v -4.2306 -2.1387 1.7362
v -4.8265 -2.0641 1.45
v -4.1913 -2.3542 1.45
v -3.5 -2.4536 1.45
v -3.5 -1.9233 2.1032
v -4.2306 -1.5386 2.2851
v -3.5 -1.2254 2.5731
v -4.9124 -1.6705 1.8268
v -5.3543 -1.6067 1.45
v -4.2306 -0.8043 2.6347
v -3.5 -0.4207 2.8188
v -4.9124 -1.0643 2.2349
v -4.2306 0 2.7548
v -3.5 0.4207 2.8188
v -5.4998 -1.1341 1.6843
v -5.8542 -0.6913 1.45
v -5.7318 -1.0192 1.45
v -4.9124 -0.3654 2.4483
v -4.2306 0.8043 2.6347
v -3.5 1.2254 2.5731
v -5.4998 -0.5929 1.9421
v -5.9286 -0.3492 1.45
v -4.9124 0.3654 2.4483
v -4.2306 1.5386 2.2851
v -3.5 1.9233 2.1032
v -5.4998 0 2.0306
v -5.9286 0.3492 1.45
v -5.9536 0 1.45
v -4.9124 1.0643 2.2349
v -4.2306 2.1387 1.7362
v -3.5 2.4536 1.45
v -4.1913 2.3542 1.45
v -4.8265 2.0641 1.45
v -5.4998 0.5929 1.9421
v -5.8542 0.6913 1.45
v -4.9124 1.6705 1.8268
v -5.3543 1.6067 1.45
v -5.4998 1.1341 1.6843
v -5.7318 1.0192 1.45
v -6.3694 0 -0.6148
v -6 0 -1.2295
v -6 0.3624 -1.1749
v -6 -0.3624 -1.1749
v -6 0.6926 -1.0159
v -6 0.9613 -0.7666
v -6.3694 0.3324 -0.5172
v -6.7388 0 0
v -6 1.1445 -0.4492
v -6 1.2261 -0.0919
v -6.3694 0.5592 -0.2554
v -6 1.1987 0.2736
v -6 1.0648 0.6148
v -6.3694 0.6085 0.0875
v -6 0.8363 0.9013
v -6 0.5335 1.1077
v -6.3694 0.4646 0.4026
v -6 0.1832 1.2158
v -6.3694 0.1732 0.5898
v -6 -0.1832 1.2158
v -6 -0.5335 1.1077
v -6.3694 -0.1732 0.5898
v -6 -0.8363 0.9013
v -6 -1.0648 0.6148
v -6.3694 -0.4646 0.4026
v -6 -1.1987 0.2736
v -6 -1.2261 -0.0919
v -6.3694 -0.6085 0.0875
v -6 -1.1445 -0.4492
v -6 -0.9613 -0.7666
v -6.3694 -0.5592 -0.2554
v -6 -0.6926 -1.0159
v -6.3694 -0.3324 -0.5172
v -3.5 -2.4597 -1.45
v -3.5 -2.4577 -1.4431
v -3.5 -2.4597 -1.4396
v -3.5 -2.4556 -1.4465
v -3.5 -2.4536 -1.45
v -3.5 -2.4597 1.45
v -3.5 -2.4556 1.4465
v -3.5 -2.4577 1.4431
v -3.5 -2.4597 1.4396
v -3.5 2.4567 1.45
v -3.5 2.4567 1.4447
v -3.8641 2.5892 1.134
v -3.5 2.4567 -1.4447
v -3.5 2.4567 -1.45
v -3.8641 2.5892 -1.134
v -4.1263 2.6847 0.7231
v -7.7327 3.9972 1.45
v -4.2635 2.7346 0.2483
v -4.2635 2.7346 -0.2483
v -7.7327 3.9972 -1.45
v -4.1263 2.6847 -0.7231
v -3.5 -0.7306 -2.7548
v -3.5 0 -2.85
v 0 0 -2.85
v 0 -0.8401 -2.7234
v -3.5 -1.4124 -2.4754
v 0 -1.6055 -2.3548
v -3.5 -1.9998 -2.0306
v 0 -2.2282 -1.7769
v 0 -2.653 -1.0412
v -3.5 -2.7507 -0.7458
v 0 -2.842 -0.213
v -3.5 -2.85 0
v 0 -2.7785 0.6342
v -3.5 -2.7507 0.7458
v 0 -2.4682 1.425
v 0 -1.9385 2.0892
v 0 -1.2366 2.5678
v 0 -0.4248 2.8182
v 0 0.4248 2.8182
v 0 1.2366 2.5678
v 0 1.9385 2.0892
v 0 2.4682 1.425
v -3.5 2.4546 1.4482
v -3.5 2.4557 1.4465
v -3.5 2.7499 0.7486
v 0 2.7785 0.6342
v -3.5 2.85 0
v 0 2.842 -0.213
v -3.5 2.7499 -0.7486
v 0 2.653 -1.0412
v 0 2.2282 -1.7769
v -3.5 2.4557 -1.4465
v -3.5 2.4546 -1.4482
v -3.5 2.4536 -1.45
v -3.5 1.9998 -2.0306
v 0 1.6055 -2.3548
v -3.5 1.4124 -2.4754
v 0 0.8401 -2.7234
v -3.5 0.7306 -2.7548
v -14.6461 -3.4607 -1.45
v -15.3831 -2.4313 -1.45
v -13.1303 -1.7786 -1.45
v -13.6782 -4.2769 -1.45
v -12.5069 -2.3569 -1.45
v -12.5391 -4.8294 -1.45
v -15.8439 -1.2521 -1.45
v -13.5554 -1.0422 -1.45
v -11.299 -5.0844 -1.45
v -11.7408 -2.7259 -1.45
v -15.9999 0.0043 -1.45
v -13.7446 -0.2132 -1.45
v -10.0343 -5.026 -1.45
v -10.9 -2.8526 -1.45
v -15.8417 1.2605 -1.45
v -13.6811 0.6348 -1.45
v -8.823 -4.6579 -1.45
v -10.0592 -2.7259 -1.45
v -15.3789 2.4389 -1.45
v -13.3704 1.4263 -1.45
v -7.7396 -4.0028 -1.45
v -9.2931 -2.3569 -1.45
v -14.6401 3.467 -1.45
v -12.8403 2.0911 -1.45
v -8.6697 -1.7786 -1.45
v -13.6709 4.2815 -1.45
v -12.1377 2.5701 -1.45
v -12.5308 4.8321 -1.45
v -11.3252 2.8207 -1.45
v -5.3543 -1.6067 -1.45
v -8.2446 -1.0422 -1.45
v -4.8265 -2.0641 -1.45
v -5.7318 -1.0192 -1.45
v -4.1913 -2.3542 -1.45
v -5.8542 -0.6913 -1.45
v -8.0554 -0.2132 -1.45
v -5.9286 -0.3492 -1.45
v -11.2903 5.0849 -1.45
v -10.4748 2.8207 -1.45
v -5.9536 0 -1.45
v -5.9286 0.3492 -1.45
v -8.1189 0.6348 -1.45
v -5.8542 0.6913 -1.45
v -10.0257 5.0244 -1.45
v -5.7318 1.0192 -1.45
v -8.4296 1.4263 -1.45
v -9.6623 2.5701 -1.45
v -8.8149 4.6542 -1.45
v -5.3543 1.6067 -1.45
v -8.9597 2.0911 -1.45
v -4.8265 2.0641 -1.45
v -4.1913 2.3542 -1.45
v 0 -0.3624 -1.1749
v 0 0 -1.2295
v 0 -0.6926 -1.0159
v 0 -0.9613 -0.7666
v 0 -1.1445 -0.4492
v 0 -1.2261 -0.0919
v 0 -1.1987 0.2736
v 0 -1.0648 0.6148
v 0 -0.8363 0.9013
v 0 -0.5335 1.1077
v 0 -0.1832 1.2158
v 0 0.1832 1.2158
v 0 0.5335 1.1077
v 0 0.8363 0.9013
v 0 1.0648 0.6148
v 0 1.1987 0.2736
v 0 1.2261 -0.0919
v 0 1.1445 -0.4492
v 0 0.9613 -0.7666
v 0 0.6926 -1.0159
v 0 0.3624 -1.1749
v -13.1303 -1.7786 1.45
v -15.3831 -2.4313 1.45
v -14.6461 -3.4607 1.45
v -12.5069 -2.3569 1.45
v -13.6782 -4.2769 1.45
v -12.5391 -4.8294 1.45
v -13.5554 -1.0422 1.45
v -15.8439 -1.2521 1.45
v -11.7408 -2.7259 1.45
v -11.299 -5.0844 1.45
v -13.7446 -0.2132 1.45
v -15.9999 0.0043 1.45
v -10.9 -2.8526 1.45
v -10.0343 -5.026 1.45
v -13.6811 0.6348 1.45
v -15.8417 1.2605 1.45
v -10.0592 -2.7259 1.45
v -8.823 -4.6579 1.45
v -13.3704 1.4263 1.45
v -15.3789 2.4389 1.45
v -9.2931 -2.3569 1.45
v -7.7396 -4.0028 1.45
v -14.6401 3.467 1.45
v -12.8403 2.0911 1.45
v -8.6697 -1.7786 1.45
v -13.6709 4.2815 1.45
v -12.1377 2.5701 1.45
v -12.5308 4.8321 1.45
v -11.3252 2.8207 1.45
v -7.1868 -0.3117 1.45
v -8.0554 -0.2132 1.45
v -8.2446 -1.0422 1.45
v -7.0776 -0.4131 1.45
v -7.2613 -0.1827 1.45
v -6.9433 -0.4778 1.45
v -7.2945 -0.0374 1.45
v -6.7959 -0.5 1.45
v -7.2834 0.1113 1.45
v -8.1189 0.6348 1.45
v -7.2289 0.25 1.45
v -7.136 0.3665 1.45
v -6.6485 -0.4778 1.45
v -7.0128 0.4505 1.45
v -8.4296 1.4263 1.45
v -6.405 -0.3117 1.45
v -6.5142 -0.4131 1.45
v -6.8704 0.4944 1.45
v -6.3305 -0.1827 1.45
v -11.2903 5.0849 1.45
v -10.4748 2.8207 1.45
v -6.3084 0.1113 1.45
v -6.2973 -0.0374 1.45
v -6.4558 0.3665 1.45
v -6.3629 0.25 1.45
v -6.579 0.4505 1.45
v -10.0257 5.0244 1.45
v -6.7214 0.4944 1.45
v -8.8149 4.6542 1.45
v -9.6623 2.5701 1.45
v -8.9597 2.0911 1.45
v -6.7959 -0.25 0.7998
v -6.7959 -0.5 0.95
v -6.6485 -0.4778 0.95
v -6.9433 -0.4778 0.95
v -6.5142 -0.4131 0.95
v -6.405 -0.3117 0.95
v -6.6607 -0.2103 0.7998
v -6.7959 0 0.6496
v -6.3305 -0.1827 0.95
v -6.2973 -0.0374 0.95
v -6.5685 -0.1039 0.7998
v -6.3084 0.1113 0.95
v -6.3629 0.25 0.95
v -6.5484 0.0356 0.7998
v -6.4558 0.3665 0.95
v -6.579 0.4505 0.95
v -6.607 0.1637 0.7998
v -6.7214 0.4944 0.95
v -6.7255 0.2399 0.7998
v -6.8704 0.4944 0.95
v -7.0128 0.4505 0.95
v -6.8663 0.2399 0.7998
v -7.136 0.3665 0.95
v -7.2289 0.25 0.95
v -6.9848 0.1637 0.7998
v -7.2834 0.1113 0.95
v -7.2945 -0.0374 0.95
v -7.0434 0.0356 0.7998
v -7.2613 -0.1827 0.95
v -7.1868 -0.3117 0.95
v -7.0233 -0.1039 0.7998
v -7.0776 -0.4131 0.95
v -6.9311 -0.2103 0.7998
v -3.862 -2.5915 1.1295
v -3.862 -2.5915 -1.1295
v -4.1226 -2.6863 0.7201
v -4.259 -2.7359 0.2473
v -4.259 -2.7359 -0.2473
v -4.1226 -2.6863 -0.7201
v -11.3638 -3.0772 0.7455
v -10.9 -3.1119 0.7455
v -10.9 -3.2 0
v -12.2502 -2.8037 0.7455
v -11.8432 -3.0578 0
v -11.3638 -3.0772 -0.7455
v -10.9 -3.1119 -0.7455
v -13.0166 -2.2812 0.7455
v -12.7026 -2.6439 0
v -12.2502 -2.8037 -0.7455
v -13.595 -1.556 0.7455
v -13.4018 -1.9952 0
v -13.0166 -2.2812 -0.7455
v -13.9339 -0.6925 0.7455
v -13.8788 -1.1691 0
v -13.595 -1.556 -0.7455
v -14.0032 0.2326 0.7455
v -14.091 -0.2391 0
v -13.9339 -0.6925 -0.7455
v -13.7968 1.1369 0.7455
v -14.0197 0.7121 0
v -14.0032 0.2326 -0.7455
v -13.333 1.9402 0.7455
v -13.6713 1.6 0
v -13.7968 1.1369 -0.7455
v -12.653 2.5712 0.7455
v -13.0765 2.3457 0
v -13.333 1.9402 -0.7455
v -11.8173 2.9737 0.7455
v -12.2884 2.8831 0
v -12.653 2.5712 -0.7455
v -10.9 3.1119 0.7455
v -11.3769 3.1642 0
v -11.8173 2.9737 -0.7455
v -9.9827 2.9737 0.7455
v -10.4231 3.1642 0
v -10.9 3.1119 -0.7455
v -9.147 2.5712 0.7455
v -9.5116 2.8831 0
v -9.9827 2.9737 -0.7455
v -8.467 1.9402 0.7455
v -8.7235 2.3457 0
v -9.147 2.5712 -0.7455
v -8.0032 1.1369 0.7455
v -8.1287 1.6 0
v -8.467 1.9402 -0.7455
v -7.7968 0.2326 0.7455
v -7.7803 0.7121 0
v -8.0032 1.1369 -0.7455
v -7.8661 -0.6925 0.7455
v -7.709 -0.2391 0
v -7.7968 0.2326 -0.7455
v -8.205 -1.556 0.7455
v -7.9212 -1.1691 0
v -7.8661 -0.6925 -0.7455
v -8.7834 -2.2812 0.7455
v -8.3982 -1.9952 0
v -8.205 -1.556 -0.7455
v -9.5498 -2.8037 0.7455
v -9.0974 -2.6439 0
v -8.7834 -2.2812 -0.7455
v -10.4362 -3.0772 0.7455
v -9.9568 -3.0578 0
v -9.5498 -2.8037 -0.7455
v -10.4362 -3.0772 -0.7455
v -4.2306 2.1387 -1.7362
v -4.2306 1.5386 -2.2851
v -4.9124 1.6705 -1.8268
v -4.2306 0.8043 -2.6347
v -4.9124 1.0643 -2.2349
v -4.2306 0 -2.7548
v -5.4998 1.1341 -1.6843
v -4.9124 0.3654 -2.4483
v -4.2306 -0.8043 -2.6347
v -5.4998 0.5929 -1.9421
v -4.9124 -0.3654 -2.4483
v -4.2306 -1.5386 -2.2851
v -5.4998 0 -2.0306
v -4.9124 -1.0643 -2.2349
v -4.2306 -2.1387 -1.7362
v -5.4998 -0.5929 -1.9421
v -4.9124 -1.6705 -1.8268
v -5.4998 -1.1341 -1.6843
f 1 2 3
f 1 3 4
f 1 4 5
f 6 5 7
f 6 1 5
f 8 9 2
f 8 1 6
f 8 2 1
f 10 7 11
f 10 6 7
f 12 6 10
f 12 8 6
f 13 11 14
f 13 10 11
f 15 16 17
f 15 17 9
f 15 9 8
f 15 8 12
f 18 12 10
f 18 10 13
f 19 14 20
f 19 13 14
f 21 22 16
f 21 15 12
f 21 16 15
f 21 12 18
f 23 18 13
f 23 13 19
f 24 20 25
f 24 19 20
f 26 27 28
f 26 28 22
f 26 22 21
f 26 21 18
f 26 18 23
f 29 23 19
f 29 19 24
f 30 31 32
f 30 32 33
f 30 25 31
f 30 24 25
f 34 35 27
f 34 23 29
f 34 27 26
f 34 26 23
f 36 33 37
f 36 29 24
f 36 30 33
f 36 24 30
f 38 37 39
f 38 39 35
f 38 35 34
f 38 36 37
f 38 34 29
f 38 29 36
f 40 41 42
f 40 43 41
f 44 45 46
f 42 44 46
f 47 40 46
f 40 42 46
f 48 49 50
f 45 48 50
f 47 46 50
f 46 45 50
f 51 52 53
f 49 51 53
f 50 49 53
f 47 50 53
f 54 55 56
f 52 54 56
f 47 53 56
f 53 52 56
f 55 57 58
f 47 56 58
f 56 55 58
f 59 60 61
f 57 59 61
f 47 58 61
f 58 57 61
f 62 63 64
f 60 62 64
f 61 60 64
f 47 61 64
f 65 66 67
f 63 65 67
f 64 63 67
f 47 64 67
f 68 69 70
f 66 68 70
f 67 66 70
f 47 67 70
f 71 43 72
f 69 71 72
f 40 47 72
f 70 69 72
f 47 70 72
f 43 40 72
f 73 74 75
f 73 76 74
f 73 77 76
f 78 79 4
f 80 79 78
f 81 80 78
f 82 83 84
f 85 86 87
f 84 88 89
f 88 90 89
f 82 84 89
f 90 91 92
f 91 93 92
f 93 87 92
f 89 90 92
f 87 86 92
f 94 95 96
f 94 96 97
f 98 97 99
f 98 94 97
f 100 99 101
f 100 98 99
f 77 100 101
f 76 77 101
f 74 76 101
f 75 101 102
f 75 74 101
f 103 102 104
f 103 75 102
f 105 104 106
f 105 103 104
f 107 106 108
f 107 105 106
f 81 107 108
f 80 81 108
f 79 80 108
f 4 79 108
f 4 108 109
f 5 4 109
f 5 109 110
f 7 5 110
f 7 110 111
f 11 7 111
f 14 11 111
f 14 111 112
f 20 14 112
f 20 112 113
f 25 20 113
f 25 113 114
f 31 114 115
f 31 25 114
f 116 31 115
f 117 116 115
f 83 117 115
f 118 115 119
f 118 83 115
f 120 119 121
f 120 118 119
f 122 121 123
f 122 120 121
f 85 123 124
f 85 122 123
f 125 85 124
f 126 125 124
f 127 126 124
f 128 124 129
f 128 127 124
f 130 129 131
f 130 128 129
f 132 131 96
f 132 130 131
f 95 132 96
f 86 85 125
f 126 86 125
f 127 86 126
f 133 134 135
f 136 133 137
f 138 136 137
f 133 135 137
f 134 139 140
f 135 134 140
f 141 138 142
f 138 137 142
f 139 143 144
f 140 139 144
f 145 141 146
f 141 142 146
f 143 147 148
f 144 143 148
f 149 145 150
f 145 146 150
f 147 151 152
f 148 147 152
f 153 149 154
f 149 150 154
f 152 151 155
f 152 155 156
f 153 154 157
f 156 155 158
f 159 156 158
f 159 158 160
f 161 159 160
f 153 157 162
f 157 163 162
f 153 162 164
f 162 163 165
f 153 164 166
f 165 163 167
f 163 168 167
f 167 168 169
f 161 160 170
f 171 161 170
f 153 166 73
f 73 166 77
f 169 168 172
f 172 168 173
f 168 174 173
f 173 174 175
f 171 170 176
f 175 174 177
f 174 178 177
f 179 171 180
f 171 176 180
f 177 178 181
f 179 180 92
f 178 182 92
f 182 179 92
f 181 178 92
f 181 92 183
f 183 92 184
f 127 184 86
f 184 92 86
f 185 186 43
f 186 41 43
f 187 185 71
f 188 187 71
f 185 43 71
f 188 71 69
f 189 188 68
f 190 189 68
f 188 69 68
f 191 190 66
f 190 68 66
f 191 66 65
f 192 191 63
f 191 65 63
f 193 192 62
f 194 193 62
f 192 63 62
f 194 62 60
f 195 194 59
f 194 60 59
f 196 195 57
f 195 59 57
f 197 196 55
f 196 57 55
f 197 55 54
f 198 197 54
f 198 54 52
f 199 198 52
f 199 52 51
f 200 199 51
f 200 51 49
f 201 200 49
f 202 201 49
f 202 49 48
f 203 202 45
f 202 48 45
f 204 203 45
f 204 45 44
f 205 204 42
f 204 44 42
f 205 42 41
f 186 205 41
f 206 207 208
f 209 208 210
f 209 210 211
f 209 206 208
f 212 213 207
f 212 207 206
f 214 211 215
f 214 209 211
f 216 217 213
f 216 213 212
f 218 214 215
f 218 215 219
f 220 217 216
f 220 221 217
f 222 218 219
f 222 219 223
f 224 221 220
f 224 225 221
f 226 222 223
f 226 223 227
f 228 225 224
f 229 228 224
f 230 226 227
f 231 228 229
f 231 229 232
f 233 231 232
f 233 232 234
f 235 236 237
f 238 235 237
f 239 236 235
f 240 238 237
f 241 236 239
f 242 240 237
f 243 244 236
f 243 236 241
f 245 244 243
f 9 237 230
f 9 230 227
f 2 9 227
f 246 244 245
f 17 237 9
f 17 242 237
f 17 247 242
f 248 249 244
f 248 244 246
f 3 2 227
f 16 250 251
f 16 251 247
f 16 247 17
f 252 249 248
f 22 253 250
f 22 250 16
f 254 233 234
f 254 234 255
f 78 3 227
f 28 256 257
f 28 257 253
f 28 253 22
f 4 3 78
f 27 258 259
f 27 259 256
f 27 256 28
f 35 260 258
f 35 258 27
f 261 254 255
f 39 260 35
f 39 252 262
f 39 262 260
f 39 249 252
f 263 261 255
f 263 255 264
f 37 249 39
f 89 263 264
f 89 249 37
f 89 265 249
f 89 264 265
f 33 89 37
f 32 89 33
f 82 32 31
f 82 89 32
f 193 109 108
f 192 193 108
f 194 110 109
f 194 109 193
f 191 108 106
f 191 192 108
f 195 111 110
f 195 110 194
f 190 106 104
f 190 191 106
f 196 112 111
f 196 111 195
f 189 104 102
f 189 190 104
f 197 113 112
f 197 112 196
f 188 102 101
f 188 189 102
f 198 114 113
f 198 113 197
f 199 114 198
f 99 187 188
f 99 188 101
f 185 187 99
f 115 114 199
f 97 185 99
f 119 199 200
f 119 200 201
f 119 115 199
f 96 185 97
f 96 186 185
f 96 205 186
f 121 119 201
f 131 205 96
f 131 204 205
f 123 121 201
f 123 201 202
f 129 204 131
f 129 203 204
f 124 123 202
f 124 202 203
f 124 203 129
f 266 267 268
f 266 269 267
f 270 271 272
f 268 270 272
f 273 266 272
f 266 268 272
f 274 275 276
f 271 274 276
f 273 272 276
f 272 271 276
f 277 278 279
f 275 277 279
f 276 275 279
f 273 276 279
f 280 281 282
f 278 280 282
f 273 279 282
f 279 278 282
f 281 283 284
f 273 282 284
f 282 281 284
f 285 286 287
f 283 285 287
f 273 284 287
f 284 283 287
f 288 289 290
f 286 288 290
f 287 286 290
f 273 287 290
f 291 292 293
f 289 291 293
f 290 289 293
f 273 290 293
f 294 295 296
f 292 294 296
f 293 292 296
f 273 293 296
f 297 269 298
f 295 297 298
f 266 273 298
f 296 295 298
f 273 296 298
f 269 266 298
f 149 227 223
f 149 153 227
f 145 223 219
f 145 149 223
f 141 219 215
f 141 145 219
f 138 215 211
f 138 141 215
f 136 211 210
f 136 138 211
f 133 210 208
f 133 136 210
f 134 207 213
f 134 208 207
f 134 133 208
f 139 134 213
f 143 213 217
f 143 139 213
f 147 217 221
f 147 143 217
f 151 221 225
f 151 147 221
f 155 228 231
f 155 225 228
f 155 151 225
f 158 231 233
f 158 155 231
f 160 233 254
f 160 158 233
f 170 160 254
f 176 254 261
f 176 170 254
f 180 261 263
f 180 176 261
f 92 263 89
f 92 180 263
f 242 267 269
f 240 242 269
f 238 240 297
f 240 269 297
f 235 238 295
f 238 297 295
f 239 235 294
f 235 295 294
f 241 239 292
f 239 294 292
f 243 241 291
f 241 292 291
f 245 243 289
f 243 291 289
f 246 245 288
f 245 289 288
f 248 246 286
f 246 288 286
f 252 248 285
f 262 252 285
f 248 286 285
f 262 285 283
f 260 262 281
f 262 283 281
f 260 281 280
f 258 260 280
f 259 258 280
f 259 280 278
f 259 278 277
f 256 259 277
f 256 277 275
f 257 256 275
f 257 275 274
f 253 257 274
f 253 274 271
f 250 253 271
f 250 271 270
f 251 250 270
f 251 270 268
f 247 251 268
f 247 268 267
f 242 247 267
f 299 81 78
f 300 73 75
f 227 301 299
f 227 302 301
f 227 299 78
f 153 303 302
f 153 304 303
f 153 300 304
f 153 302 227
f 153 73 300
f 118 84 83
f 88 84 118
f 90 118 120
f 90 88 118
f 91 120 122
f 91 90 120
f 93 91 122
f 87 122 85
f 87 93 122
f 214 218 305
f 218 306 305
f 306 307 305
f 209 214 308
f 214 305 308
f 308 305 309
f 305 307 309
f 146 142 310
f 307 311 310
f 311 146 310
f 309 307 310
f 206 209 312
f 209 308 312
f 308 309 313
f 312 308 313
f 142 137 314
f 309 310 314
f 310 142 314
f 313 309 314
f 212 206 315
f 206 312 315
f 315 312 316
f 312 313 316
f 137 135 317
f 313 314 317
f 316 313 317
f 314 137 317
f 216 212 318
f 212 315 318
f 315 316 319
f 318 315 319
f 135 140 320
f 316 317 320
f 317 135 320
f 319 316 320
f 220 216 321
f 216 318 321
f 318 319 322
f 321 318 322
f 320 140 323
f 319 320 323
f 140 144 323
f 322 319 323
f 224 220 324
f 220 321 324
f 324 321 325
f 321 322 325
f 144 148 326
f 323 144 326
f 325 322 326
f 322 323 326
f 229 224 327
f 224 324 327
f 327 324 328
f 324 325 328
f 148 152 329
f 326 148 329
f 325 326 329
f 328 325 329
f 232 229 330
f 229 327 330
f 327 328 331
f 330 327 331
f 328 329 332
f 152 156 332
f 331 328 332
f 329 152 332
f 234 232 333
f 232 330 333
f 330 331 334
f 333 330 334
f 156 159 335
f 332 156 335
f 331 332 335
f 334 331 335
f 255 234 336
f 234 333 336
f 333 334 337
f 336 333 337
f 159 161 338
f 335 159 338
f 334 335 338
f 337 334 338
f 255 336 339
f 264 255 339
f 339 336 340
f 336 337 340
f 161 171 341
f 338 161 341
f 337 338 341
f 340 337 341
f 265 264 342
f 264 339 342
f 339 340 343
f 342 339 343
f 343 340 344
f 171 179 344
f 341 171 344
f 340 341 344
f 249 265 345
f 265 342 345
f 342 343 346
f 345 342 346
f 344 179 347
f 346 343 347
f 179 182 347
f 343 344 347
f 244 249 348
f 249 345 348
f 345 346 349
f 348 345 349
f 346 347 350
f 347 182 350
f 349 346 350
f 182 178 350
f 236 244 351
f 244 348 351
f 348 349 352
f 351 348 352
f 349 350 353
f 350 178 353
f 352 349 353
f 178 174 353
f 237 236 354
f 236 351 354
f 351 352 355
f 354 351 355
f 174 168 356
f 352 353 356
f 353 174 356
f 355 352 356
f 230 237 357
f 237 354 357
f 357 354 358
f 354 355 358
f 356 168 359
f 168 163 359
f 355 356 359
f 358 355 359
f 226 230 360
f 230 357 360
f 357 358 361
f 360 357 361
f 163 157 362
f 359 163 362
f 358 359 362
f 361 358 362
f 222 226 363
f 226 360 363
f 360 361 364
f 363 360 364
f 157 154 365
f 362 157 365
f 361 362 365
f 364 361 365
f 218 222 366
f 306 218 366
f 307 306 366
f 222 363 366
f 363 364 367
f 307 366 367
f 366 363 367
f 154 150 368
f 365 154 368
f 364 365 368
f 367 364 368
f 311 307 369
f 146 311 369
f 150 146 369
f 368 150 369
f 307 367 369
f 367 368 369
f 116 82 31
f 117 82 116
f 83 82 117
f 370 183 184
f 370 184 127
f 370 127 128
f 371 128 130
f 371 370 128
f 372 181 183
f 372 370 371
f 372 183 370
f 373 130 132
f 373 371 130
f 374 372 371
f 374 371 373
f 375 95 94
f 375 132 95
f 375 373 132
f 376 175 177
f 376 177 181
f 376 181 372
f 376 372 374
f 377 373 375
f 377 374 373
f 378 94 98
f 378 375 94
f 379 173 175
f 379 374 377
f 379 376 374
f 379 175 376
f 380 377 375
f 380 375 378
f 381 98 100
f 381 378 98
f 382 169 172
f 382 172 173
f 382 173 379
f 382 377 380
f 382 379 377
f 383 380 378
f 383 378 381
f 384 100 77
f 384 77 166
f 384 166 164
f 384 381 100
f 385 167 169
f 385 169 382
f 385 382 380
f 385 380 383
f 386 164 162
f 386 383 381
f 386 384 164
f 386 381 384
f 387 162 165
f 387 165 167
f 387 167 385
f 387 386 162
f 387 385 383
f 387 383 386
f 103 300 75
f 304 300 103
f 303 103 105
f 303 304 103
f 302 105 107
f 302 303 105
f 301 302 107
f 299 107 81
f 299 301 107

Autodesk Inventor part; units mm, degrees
ref_plane "YZ Plane" through (0, 0, 0) normal (1, 0, 0) x (0, 1, 0)
ref_plane "XZ Plane" through (0, 0, 0) normal (0, 1, 0) x (-1, 0, 0)
ref_plane "XY Plane" through (0, 0, 0) normal (0, 0, 1) x (1, 0, 0)
sketch "Sketch1" plane through (0, 0, 0) normal (0, 1, 0) x (-1, 0, 0)
  line L0 (3.5, 0) -> (-5.6696, 0) construction
  line L1 (0, -2.85) -> (3.5, -2.85)
  arc A0 (3.5, -2.85) -> (6.35, 0) centre (3.5, 0) ccw
  line L2 (0, 0) -> (0, -2.85)
  line L3 (0, 0) -> (6.35, 0)
  point P0 (-1.0848, 0)
  dimension "d0" = 2.85
  dimension "d1" = 3.5
revolve "Revolution1" add sketch "Sketch1" angle 360 about axis through (-3.5, 0, 0) along (1, 0, 0)
sketch "Sketch2" plane through (0, 0, 0) normal (0, 0, 1) x (1, 0, 0)
  arc A0 (-7.7327, 3.9972) -> (-7.7396, -4.0028) centre (-10.9, 0) ccw
  line L0 (0, -2.85) -> (0, 2.85) projected
  line L1 (-3.5, -2.4597) -> (-7.7396, -4.0028)
  line L2 (-3.5, 2.4567) -> (-7.7327, 3.9972)
  arc A1 (-3.5, 2.85) -> (-6.35, 0) centre (-3.5, 0) ccw projected
  line L3 (-3.5, 2.85) -> (0, 2.85) projected
  line L4 (0, 2.85) -> (0, -2.85) projected
  line L5 (0, -2.85) -> (-3.5, -2.85) projected
  arc A2 (-6.35, 0) -> (-3.5, -2.85) centre (-3.5, 0) ccw projected
  line L6 (-3.5, 2.4567) -> (-3.5, -2.4597)
  line L7 (-3.5, -2.85) -> (-3.5, 2.85) projected
  point P0 (0, 0)
  dimension "d3" = 10.2
  dimension "d4" = 10.9
  dimension "d7" = 8
  dimension "d12" = 110
  dimension "d13" = 110
extrude "Extrusion1" add sketch "Sketch2" along normal mid plane 2.9 contours L2 A1 A2 L1 A0 | L2 L6 L1 A2 A1
hole "Hole1" at (0, 0, 0) direction (-1, 0, 0) diameter 2.459 depth 6 tip angle 118 thread size "M3x0.5" class "6H" standard "ANSI Metric M Profile"
ref_plane "Work Plane1" through (-10.9, 0, 0) normal (1, 0, 0) x (0, 0, 1)
sketch "Sketch3" plane through (-10.9, 0, 0) normal (1, 0, 0) x (0, 0, 1)
  line L0 (-1.45, -5.1) -> (-1.45, 5.1) projected
  line L1 (-1.45, 5.1) -> (1.45, 5.1) projected
  line L2 (1.45, 5.1) -> (1.45, -5.1) projected
  line L3 (1.45, -5.1) -> (-1.45, -5.1) projected
  arc A0 (1.45, 2.8526) -> (-1.45, 2.8526) centre (0, 0) ccw
  line L4 (1.45, 0) -> (-1.45, 0)
  line L5 (-1.45, 2.8526) -> (-1.45, 0)
  line L6 (1.45, 0) -> (1.45, 2.8526)
  line L7 (-3.99, 0) -> (3.99, 0) projected
revolve "Revolution2" cut sketch "Sketch3" angle 360 about axis through (-10.9, 0, 0) along (0, 0, 1) contours L0 A0 L2 L4
sketch "Sketch4" plane through (0, 0, 1.45) normal (0, 0, 1) x (1, 0, 0)
  point P0 (0, 0)
  point P1 (-6.7959, 0)
hole "Hole2" at (-6.7959, 0, 1.45) direction (0, 0, -1) diameter 1 depth 0.5 tip angle 118
properties part number "500-103" material "Steel"
